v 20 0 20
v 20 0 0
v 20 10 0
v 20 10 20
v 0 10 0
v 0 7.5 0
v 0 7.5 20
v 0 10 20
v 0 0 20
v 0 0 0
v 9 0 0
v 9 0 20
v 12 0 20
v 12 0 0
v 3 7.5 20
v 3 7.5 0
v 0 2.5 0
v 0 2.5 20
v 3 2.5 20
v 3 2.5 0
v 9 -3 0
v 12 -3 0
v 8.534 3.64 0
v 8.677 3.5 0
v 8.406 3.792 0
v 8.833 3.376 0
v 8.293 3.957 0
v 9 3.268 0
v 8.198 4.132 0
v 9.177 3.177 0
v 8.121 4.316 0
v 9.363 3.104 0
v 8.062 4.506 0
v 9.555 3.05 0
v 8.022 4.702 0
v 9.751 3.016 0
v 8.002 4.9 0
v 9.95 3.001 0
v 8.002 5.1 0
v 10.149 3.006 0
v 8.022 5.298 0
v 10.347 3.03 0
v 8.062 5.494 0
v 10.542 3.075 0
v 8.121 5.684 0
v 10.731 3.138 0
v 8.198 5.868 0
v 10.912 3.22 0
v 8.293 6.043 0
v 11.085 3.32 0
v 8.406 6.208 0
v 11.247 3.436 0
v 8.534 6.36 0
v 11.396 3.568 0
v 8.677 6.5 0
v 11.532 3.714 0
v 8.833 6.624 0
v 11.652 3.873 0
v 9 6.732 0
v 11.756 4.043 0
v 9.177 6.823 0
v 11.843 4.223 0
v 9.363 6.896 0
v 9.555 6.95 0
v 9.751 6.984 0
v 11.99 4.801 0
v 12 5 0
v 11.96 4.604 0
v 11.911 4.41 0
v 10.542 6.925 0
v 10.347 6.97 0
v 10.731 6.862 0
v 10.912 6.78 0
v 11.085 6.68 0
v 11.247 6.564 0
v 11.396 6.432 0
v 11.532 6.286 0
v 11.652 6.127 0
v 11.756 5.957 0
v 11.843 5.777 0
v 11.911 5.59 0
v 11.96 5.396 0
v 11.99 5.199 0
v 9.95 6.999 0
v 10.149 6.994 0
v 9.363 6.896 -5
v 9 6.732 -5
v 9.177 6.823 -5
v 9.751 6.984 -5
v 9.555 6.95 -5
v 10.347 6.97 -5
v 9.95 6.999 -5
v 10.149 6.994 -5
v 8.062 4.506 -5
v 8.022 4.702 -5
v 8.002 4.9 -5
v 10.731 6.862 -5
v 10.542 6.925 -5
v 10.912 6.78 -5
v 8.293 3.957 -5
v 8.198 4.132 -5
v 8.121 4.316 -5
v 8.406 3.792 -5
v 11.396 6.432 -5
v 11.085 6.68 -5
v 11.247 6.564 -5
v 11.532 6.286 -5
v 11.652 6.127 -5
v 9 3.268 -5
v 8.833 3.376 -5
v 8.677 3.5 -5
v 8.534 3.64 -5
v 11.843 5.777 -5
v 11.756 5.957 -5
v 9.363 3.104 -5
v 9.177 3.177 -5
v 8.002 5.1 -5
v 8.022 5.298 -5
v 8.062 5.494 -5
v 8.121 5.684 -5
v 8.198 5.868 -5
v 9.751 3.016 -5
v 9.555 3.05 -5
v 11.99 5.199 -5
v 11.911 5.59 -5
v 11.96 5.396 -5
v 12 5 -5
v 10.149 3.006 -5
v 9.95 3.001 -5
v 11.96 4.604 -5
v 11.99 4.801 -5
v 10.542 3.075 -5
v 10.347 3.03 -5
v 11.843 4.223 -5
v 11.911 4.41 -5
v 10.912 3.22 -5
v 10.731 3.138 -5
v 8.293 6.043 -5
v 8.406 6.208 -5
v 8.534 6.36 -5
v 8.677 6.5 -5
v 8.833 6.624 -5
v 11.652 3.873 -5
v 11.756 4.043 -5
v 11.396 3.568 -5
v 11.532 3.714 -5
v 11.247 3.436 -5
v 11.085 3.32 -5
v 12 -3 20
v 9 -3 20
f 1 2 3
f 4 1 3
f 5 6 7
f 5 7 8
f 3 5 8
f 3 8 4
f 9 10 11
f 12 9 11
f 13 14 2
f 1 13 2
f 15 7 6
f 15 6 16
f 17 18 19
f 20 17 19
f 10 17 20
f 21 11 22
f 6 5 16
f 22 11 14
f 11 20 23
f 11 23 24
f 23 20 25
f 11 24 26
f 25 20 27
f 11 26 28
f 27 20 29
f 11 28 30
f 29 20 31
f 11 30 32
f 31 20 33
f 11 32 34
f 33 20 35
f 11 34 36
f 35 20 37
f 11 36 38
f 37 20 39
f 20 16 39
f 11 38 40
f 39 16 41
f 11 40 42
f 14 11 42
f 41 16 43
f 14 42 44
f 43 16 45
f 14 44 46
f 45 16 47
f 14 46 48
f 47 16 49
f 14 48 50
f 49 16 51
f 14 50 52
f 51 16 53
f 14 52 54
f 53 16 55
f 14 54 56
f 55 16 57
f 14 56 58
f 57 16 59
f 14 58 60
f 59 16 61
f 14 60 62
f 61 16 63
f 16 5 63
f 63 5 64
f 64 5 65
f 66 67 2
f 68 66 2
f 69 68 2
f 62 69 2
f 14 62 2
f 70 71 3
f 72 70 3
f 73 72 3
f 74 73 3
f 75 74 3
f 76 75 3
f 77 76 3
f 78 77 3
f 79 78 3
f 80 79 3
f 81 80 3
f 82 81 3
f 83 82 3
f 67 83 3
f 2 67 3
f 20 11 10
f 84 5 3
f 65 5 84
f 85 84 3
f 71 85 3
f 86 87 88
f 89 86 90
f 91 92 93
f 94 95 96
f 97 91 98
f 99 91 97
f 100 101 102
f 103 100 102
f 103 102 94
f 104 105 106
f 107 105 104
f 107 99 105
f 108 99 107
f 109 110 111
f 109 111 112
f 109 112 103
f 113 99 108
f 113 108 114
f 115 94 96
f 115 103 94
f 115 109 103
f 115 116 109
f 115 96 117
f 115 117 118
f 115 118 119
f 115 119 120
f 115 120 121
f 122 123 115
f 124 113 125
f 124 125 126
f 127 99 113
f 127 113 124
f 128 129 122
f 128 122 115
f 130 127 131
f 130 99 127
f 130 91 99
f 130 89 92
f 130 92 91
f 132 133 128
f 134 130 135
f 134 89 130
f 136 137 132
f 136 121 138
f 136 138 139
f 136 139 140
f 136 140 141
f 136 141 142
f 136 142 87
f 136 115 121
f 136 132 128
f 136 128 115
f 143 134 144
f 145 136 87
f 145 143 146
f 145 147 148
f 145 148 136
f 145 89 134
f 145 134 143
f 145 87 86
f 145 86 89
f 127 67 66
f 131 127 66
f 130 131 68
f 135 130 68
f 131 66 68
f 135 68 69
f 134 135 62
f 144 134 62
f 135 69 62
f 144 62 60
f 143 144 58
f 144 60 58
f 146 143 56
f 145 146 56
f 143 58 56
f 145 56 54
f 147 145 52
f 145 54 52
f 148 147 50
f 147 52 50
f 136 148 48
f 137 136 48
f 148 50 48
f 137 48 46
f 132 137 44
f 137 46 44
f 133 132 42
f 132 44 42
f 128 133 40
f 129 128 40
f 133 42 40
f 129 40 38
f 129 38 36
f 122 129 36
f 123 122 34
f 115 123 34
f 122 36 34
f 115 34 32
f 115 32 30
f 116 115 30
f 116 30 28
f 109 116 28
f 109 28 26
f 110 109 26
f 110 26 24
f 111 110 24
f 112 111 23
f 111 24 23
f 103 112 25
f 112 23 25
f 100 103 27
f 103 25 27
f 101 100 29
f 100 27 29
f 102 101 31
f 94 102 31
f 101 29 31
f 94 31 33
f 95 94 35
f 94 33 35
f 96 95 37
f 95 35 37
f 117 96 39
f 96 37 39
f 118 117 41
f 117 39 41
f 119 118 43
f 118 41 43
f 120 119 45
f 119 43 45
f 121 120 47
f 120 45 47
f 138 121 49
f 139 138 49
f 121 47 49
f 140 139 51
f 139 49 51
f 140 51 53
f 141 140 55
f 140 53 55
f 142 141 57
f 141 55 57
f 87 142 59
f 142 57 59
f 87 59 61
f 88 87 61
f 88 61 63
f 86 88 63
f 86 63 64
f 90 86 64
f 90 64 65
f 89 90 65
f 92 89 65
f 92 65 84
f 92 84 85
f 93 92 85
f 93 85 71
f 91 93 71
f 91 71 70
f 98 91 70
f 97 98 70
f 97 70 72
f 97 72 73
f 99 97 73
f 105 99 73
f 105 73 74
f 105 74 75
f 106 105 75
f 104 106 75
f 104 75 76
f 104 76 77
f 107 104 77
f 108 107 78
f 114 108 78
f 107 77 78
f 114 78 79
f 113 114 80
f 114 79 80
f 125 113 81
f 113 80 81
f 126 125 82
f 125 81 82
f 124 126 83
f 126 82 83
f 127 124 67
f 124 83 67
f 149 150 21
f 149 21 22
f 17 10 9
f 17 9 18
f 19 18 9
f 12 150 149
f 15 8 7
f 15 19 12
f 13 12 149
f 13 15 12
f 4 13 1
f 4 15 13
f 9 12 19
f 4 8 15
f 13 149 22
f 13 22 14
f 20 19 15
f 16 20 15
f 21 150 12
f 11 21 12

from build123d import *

# Parameters (mm, degrees)
F0_W     = 20
F0_H     = 10
F1_DEPTH = 20
F3_R     = 2
F4_DEPTH = 5
F5_DEPTH = 5
F2_W     = 3
F2_H     = 5
F6_DEPTH = 49
F2_H_2   = 3
F7_DEPTH = 20
F8_DEPTH = 20


# Not quite as in the source:
# - an extrude ends at something that could not be found from the text; its depth is read off the source's solid


with BuildPart() as f1:
    # F0 (on Top) → F1 (new body)
    with BuildSketch(Plane.XY):
        with Locations((10, 5)):
            Rectangle(F0_W, F0_H)
    extrude(amount=F1_DEPTH)

    # F3 (on face) → F4 (join)
    with BuildSketch(Plane(origin=(0, 0, 0), x_dir=(1, 0, 0), z_dir=(0, 0, -1))):
        with Locations((10, -5)):
            Circle(F3_R)
    extrude(amount=F4_DEPTH)

    # F3 (on face) → F5 (join)
    with BuildSketch(Plane(origin=(0, 0, 0), x_dir=(1, 0, 0), z_dir=(0, 0, -1))):
        with Locations((10, -5)):
            Circle(F3_R)
    extrude(amount=F5_DEPTH)

    # F2 (on face) → F6 (cut, through all)
    with BuildSketch(Plane.XY.offset(20)):
        with Locations((1.5, 5)):
            Rectangle(F2_W, F2_H)
    extrude(amount=-F6_DEPTH, mode=Mode.SUBTRACT)

    # F2 (on face) → F7 (join, through all)
    with BuildSketch(Plane.XY.offset(20)):
        with Locations((1.5, 5)):
            Rectangle(F2_W, F2_H)
        with Locations((10.5, -1.5)):
            Rectangle(F2_W, F2_H_2)
    extrude(amount=-F7_DEPTH)

    # F2 (on face) → F8 (cut, through all)
    with BuildSketch(Plane.XY.offset(20)):
        with Locations((1.5, 5)):
            Rectangle(F2_W, F2_H)
    extrude(amount=-F8_DEPTH, mode=Mode.SUBTRACT)


solid = f1.part
